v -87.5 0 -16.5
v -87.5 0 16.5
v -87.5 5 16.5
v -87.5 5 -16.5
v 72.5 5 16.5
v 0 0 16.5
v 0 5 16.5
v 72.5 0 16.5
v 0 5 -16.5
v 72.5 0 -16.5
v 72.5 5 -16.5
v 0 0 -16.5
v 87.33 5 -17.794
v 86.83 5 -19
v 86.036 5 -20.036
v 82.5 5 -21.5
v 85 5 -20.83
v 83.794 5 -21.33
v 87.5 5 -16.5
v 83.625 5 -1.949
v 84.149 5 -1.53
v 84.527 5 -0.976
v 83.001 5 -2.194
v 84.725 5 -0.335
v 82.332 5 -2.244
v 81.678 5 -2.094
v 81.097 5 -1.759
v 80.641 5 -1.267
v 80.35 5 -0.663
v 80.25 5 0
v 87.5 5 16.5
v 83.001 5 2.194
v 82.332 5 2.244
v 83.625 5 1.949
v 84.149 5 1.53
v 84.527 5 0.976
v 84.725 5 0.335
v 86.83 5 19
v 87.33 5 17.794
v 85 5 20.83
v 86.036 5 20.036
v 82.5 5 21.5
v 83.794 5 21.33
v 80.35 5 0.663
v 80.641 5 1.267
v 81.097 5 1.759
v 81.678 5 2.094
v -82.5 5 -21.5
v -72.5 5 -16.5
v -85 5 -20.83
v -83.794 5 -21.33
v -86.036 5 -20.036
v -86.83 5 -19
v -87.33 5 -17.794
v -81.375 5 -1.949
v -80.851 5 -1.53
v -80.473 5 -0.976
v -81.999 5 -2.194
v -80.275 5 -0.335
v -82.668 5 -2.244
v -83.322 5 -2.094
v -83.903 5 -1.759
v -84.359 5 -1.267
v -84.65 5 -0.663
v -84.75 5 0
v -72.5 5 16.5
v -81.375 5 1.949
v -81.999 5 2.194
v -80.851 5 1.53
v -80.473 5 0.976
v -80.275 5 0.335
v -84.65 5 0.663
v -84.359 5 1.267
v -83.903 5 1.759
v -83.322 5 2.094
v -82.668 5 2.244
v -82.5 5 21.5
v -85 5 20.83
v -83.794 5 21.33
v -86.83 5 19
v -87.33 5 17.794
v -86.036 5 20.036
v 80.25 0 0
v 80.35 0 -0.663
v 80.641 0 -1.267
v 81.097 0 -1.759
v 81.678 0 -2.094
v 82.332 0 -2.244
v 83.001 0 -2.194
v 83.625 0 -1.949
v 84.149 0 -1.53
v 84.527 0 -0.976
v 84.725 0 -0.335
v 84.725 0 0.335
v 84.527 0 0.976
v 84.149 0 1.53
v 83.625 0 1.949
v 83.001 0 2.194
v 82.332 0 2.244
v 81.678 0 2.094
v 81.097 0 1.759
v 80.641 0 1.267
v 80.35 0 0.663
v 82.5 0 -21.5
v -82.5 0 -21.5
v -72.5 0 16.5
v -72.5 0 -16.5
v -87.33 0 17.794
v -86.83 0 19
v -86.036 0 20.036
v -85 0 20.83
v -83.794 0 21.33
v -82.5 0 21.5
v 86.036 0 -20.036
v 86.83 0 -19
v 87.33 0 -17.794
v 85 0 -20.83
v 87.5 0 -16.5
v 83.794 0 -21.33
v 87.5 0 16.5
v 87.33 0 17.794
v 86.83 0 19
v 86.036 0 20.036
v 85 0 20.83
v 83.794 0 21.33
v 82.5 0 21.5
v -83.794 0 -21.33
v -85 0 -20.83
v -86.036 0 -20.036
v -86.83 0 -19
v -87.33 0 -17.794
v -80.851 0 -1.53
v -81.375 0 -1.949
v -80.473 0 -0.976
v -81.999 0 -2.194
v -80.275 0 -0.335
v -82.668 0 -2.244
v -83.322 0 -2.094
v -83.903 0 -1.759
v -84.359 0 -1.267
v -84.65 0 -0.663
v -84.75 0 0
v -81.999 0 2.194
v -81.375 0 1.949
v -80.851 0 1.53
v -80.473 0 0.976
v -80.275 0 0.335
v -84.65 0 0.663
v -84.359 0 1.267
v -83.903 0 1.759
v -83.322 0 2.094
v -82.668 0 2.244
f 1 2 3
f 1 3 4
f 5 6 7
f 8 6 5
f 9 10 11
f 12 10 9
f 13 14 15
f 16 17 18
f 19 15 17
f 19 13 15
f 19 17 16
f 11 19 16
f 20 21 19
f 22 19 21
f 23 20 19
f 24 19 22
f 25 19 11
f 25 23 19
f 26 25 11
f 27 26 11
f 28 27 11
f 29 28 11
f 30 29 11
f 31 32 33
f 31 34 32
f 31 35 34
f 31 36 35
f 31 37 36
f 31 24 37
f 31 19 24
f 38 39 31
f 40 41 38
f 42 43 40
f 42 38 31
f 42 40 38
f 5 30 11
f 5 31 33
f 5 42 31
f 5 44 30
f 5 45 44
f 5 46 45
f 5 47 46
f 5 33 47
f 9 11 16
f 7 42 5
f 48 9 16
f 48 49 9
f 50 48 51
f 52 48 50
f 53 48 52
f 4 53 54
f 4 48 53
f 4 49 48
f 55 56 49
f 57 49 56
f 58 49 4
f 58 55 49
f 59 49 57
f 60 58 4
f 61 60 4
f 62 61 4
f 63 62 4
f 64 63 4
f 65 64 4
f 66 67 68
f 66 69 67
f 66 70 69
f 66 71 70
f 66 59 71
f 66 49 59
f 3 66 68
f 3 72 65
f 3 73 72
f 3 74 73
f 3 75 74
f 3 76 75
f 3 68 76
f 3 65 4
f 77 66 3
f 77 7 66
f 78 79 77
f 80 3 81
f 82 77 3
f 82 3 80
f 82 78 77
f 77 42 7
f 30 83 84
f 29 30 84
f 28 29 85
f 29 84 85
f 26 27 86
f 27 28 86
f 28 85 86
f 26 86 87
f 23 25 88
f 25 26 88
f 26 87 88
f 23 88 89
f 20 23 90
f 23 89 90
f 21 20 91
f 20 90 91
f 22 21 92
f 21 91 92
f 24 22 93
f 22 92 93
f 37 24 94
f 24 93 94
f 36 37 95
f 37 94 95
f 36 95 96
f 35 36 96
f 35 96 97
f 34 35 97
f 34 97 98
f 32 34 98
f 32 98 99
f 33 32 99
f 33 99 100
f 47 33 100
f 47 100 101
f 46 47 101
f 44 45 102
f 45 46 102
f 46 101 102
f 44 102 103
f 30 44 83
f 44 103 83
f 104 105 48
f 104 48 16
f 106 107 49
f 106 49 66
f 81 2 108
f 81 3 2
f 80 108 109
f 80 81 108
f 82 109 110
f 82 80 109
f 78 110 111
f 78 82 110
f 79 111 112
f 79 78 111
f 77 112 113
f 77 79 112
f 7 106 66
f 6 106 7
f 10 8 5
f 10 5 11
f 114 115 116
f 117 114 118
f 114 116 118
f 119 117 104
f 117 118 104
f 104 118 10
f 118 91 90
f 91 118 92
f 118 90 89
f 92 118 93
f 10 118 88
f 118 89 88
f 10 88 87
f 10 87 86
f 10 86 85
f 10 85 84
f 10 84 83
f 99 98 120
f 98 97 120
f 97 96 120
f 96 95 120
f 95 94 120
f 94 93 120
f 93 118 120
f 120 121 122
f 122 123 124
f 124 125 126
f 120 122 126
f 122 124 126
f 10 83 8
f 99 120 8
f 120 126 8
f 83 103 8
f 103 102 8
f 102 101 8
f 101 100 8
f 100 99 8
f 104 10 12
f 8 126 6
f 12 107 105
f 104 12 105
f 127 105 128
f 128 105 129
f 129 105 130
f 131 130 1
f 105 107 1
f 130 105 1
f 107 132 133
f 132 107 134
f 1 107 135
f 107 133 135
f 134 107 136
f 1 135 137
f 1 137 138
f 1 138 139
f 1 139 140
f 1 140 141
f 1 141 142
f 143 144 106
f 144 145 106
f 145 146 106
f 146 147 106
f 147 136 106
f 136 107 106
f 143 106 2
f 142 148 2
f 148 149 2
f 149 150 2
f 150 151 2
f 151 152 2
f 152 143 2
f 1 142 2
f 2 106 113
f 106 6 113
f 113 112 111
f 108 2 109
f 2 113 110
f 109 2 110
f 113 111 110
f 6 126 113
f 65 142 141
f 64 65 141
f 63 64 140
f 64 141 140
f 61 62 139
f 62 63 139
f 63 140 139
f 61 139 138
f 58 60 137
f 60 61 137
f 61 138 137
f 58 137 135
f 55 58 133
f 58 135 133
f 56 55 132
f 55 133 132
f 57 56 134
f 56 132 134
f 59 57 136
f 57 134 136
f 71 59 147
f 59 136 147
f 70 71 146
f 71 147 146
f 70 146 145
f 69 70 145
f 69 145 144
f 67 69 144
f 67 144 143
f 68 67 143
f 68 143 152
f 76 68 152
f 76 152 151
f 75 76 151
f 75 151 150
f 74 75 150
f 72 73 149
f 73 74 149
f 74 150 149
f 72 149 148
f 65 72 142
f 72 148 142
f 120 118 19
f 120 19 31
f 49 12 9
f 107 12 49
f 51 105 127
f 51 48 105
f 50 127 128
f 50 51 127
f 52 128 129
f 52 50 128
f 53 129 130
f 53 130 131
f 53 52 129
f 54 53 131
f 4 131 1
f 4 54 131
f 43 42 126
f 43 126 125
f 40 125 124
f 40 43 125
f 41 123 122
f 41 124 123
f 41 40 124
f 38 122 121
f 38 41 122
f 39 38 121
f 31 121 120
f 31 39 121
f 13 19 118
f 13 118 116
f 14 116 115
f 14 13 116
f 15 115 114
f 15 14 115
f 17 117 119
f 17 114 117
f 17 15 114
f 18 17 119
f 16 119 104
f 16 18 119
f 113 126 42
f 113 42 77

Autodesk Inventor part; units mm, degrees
ref_plane "YZ Plane" through (0, 0, 0) normal (1, 0, 0) x (0, 1, 0)
ref_plane "XZ Plane" through (0, 0, 0) normal (0, 1, 0) x (-1, 0, 0)
ref_plane "XY Plane" through (0, 0, 0) normal (0, 0, 1) x (1, 0, 0)
sketch "Sketch2" plane through (0, 0, 0) normal (0, 1, 0) x (-1, 0, 0)
  line L0 (72.5, 16.5) -> (-72.5, 16.5)
  line L1 (-72.5, 16.5) -> (-72.5, -16.5)
  line L2 (-72.5, -16.5) -> (72.5, -16.5)
  line L3 (72.5, -16.5) -> (72.5, 16.5)
  line L4 (72.5, 16.5) -> (-72.5, -16.5) construction
  line L5 (-72.5, 16.5) -> (72.5, -16.5) construction
  line L6 (87.5, -21.5) -> (-87.5, -21.5)
  line L7 (-87.5, -21.5) -> (-87.5, 21.5)
  line L8 (-87.5, 21.5) -> (87.5, 21.5)
  line L9 (87.5, 21.5) -> (87.5, -21.5)
  line L10 (87.5, -21.5) -> (-87.5, 21.5) construction
  line L11 (-87.5, -21.5) -> (87.5, 21.5) construction
  line L12 (72.5, 0) -> (82.5, 0) construction
  circle A0 centre (82.5, 0) radius 2.25
  line L13 (0, -16.5) -> (0, 16.5)
  circle A1 centre (-82.5, 0) radius 2.25
  point P0 (0, 0)
  dimension "d12" = 145
  dimension "d13" = 33
  dimension "d14" = 175
  dimension "d15" = 43
  dimension "d16" = 10
  dimension "d17" = 4.5
extrude "Extrusion2" add sketch "Sketch2" along normal blind 5
fillet "Fillet1" radius 5 1 edges at (87.5, 2.5, -21.5)
fillet "Fillet2" radius 5 3 edges at (87.5, 2.5, 21.5) (-87.5, 2.5, -21.5) (-87.5, 2.5, 21.5)
properties part number "Frame"
